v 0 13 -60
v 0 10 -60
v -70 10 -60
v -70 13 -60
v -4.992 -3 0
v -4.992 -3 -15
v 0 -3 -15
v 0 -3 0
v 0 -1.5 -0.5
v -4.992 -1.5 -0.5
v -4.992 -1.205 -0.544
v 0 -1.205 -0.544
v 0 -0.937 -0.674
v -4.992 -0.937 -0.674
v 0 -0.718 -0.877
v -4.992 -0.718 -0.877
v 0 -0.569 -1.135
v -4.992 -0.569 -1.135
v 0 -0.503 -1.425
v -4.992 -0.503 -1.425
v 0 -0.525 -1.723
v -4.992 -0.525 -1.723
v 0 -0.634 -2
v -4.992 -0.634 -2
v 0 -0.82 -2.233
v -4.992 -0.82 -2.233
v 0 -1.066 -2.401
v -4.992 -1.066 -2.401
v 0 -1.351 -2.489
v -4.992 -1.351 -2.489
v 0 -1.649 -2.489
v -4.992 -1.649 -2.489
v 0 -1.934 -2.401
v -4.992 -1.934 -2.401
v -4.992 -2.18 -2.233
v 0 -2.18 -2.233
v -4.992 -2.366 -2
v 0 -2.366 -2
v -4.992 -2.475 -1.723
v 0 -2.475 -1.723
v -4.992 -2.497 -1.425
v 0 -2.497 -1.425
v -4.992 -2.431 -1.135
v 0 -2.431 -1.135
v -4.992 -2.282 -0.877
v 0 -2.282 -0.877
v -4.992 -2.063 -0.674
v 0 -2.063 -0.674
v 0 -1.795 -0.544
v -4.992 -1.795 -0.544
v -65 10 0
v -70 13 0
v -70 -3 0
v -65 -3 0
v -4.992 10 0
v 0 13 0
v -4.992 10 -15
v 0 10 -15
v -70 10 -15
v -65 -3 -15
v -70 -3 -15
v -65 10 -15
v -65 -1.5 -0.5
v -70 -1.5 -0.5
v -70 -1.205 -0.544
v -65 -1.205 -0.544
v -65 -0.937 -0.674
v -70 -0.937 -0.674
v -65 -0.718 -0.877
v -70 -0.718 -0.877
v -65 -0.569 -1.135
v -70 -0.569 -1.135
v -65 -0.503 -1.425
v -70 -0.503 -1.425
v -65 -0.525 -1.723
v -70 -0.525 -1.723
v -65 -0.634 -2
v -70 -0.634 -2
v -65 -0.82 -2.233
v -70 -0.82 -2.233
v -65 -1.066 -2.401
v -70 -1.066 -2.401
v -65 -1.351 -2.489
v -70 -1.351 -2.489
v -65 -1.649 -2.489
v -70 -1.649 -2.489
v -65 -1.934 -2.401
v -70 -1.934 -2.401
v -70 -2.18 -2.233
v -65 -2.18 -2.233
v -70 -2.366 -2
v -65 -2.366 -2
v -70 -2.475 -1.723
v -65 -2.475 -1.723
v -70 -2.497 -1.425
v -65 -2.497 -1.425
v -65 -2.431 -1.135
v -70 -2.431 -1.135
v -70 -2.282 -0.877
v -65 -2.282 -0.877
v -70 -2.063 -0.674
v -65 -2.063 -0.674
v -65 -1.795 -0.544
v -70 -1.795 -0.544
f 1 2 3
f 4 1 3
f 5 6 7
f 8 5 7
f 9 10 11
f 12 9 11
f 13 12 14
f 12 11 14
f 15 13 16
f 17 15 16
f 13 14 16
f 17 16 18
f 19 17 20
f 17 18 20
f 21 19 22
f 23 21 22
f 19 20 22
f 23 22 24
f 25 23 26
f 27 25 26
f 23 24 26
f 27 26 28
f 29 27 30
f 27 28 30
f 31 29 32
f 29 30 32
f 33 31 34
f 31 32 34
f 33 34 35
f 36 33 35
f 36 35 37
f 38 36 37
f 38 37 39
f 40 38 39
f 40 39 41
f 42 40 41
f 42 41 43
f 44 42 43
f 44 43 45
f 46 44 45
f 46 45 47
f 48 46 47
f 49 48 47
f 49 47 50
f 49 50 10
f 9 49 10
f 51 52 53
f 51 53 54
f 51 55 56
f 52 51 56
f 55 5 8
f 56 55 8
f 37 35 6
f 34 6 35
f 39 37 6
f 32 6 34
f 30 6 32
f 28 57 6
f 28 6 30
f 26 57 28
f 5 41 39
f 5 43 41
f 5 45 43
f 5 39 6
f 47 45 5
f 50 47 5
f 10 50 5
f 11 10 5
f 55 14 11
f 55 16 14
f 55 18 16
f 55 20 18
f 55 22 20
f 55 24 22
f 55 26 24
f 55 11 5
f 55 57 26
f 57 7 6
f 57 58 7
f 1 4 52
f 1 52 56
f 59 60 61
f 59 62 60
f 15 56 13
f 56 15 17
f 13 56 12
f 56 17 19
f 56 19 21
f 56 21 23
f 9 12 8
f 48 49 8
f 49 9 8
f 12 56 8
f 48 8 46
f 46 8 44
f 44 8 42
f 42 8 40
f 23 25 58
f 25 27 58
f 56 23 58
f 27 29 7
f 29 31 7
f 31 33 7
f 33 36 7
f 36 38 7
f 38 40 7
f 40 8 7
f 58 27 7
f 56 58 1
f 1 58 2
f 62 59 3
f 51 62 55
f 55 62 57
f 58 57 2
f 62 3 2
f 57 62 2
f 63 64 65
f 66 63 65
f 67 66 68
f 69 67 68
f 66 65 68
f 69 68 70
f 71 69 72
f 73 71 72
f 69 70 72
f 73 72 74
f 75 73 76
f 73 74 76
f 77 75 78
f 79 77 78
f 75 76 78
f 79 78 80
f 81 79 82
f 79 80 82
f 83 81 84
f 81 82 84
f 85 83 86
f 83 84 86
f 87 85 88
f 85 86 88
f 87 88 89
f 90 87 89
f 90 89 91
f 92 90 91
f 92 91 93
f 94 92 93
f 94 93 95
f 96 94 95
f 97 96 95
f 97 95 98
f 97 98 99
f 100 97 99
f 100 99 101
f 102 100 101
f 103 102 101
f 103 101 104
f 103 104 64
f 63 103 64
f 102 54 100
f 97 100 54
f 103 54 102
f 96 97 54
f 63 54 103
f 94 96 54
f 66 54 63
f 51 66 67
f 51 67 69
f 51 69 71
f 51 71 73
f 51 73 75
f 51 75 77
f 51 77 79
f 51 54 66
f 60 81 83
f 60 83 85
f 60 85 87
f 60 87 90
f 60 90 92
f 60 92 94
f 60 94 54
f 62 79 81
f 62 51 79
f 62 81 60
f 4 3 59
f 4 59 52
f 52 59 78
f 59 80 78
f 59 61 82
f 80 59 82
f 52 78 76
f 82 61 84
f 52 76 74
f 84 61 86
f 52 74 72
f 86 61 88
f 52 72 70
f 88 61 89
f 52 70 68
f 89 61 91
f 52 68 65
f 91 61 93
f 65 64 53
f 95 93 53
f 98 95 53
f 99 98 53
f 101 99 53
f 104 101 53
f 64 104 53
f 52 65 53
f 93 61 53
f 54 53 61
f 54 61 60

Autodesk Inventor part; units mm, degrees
ref_plane "YZ Plane" through (0, 0, 0) normal (1, 0, 0) x (0, 1, 0)
ref_plane "Work Plane1" through (-35, 0, -35) normal (0, 1, 0) x (1, 0, 0)
ref_plane "Work Plane2" through (-23.7602, 13, -55.0885) normal (0, -1, 0) x (1, 0, 0)
sketch "Sketch1" plane through (-35, 0, -35) normal (0, 1, 0) x (1, 0, 0)
  line L0 (-4, 96.5) -> (-2.5, 96.5) projected
  line L1 (-2.5, 96.5) -> (-2.5, 43.5) projected
  line L2 (-2.5, 43.5) -> (-4, 43.5) projected
  line L3 (-4, 43.5) -> (-4, 96.5) projected
  line L4 (31, 43.5) -> (31, 96.5) projected
  line L5 (31, 96.5) -> (32.5, 96.5) projected
  line L6 (32.5, 96.5) -> (32.5, 43.5) projected
  line L7 (32.5, 43.5) -> (31, 43.5) projected
  line L8 (4, 96.5) -> (4, 43.5) projected
  line L9 (4, 43.5) -> (2.5, 43.5) projected
  line L10 (2.5, 43.5) -> (2.5, 96.5) projected
  line L11 (2.5, 96.5) -> (4, 96.5) projected
  line L12 (-31, 43.5) -> (-32.5, 43.5) projected
  line L13 (-32.5, 43.5) -> (-32.5, 96.5) projected
  line L14 (-32.5, 96.5) -> (-31, 96.5) projected
  line L15 (-31, 96.5) -> (-31, 43.5) projected
  circle A0 centre (0, 0) radius 8.5 projected
  line L16 (-35, -20) -> (-30, -20) projected
  line L17 (-30, -20) -> (-30, -35) projected
  line L18 (-30, -35) -> (30.0078, -35) projected
  line L19 (30.0078, -35) -> (30.0078, -20) projected
  line L20 (30.0078, -20) -> (35, -20) projected
  line L21 (35, -20) -> (35, 105) projected
  line L22 (35, 105) -> (-35, 105) projected
  line L23 (-35, 105) -> (-35, -20) projected
  line L24 (-35, -35) -> (35, -35)
  line L25 (35, -35) -> (35, 25)
  line L26 (35, 25) -> (-35, 25)
  line L27 (-35, 25) -> (-35, -35)
  line L28 (-4, 96.5) -> (-2.5, 96.5)
  line L29 (-2.5, 96.5) -> (-2.5, 43.5)
  line L30 (-2.5, 43.5) -> (-4, 43.5)
  line L31 (-4, 43.5) -> (-4, 96.5)
  line L32 (31, 43.5) -> (31, 96.5)
  line L33 (31, 96.5) -> (32.5, 96.5)
  line L34 (32.5, 96.5) -> (32.5, 43.5)
  line L35 (32.5, 43.5) -> (31, 43.5)
  line L36 (4, 96.5) -> (4, 43.5)
  line L37 (4, 43.5) -> (2.5, 43.5)
  line L38 (2.5, 43.5) -> (2.5, 96.5)
  line L39 (2.5, 96.5) -> (4, 96.5)
  line L40 (-31, 43.5) -> (-32.5, 43.5)
  line L41 (-32.5, 43.5) -> (-32.5, 96.5)
  line L42 (-32.5, 96.5) -> (-31, 96.5)
  line L43 (-31, 96.5) -> (-31, 43.5)
  circle A1 centre (0, 0) radius 8.5
  line L44 (-35, -20) -> (-30, -20)
  line L45 (-30, -20) -> (-30, -35)
  line L46 (-30, -35) -> (30.0078, -35)
  line L47 (30.0078, -35) -> (30.0078, -20)
  line L48 (30.0078, -20) -> (35, -20)
  line L49 (35, -20) -> (35, 105)
  line L50 (35, 105) -> (-35, 105)
  line L51 (-35, 105) -> (-35, -20)
  line L52 (-35, -35) -> (35, -35)
  line L53 (35, -35) -> (35, 25)
  line L54 (35, 25) -> (-35, 25)
  line L55 (-35, 25) -> (-35, -35)
  point P0 (35, -35)
  point P1 (35, -35)
  dimension "d0" = 60
  dimension "d3" = 60
extrude "Extrusion1" add sketch "Sketch1" along normal up to surface (13 mm away) contours A0 | L23 L26 L21 L20 L19 L18 L17 L16 | L16 L17 L24 L27 | L19 L20 L25 L24
sketch "Sketch2" plane through (-35, 0, -35) normal (0, 1, 0) x (1, 0, 0)
  line L0 (-4, 96.5) -> (-2.5, 96.5)
  line L1 (-2.5, 96.5) -> (-2.5, 43.5)
  line L2 (-2.5, 43.5) -> (-4, 43.5)
  line L3 (-4, 43.5) -> (-4, 96.5)
  line L4 (31, 43.5) -> (31, 96.5)
  line L5 (31, 96.5) -> (32.5, 96.5)
  line L6 (32.5, 96.5) -> (32.5, 43.5)
  line L7 (32.5, 43.5) -> (31, 43.5)
  line L8 (4, 96.5) -> (4, 43.5)
  line L9 (4, 43.5) -> (2.5, 43.5)
  line L10 (2.5, 43.5) -> (2.5, 96.5)
  line L11 (2.5, 96.5) -> (4, 96.5)
  line L12 (-31, 43.5) -> (-32.5, 43.5)
  line L13 (-32.5, 43.5) -> (-32.5, 96.5)
  line L14 (-32.5, 96.5) -> (-31, 96.5)
  line L15 (-31, 96.5) -> (-31, 43.5)
  circle A0 centre (0, 0) radius 8.5
  line L16 (-35, -20) -> (-30, -20)
  line L17 (-30, -20) -> (-30, -35)
  line L18 (-30, -35) -> (30.0078, -35)
  line L19 (30.0078, -35) -> (30.0078, -20)
  line L20 (30.0078, -20) -> (35, -20)
  line L21 (35, -20) -> (35, 105)
  line L22 (35, 105) -> (-35, 105)
  line L23 (-35, 105) -> (-35, -20)
  line L24 (-35, -35) -> (35, -35)
  line L25 (35, -35) -> (35, 25)
  line L26 (35, 25) -> (-35, 25)
  line L27 (-35, 25) -> (-35, -35)
  line L28 (-4, 96.5) -> (-2.5, 96.5)
  line L29 (-2.5, 96.5) -> (-2.5, 43.5)
  line L30 (-2.5, 43.5) -> (-4, 43.5)
  line L31 (-4, 43.5) -> (-4, 96.5)
  line L32 (31, 43.5) -> (31, 96.5)
  line L33 (31, 96.5) -> (32.5, 96.5)
  line L34 (32.5, 96.5) -> (32.5, 43.5)
  line L35 (32.5, 43.5) -> (31, 43.5)
  line L36 (4, 96.5) -> (4, 43.5)
  line L37 (4, 43.5) -> (2.5, 43.5)
  line L38 (2.5, 43.5) -> (2.5, 96.5)
  line L39 (2.5, 96.5) -> (4, 96.5)
  line L40 (-31, 43.5) -> (-32.5, 43.5)
  line L41 (-32.5, 43.5) -> (-32.5, 96.5)
  line L42 (-32.5, 96.5) -> (-31, 96.5)
  line L43 (-31, 96.5) -> (-31, 43.5)
  circle A1 centre (0, 0) radius 8.5
  line L44 (-35, -20) -> (-30, -20)
  line L45 (-30, -20) -> (-30, -35)
  line L46 (-30, -35) -> (30.0078, -35)
  line L47 (30.0078, -35) -> (30.0078, -20)
  line L48 (30.0078, -20) -> (35, -20)
  line L49 (35, -20) -> (35, 105)
  line L50 (35, 105) -> (-35, 105)
  line L51 (-35, 105) -> (-35, -20)
  line L52 (-35, -35) -> (35, -35)
  line L53 (35, -35) -> (35, 25)
  line L54 (35, 25) -> (-35, 25)
  line L55 (-35, 25) -> (-35, -35)
  point P0 (35, -35)
  point P1 (35, -35)
  point P2 (35, -35)
  dimension "d4" = 60
  dimension "d5" = 60
extrude "Extrusion2" cut sketch "Sketch2" against normal blind 3 from surface at 13 contours A0 | L23 L26 L21 L20 L19 L18 L17 L16 | L16 L17 L24 L27 | L19 L20 L25 L24 keep common part
sketch "Sketch3" plane through (-70, 10, 0) normal (0, -1, 0) x (1, 0, 0)
  line L0 (5, 0) -> (5, -15) projected
  line L1 (5, -15) -> (0, -15) projected
  line L2 (0, 0) -> (0, -60) projected
  line L3 (70, 0) -> (0, 0) projected
  line L4 (0, 0) -> (0, -60) projected
  line L5 (0, -60) -> (70, -60) projected
  line L6 (70, -60) -> (70, 0) projected
  line L7 (65.0078, -15) -> (65.0078, 0) projected
  line L8 (70, -15) -> (65.0078, -15) projected
  line L9 (70, -60) -> (70, 0) projected
  line L10 (0, -15) -> (5, -15)
  line L11 (5, -15) -> (5, 0)
  line L12 (5, 0) -> (0, 0)
  line L13 (0, 0) -> (0, -15)
  line L14 (65.0078, 0) -> (70, 0)
  line L15 (70, 0) -> (70, -15)
  line L16 (70, -15) -> (65.0078, -15)
  line L17 (65.0078, -15) -> (65.0078, 0)
ref_plane "Work Plane3" through (-70.7285, -3, -140.3642) normal (0, -1, 0) x (1, 0, 0)
extrude "Extrusion3" add sketch "Sketch3" along normal up to surface (13 mm away) contours L0 L1 L2 L3 | L3 L6 L8 L7
sketch "Sketch4" plane through (-70, 13, -60) normal (-1, 0, 0) x (0, 0, 1)
  line L0 (45, -16) -> (60, -16) projected
  line L1 (60, -13) -> (64.2426, -13) construction
  circle A0 centre (58.5, -14.5) radius 1
  dimension "d11" = 2
extrude "Extrusion4" cut sketch "Sketch4" against normal up to surface (70 mm away)
properties part number "base_3"
